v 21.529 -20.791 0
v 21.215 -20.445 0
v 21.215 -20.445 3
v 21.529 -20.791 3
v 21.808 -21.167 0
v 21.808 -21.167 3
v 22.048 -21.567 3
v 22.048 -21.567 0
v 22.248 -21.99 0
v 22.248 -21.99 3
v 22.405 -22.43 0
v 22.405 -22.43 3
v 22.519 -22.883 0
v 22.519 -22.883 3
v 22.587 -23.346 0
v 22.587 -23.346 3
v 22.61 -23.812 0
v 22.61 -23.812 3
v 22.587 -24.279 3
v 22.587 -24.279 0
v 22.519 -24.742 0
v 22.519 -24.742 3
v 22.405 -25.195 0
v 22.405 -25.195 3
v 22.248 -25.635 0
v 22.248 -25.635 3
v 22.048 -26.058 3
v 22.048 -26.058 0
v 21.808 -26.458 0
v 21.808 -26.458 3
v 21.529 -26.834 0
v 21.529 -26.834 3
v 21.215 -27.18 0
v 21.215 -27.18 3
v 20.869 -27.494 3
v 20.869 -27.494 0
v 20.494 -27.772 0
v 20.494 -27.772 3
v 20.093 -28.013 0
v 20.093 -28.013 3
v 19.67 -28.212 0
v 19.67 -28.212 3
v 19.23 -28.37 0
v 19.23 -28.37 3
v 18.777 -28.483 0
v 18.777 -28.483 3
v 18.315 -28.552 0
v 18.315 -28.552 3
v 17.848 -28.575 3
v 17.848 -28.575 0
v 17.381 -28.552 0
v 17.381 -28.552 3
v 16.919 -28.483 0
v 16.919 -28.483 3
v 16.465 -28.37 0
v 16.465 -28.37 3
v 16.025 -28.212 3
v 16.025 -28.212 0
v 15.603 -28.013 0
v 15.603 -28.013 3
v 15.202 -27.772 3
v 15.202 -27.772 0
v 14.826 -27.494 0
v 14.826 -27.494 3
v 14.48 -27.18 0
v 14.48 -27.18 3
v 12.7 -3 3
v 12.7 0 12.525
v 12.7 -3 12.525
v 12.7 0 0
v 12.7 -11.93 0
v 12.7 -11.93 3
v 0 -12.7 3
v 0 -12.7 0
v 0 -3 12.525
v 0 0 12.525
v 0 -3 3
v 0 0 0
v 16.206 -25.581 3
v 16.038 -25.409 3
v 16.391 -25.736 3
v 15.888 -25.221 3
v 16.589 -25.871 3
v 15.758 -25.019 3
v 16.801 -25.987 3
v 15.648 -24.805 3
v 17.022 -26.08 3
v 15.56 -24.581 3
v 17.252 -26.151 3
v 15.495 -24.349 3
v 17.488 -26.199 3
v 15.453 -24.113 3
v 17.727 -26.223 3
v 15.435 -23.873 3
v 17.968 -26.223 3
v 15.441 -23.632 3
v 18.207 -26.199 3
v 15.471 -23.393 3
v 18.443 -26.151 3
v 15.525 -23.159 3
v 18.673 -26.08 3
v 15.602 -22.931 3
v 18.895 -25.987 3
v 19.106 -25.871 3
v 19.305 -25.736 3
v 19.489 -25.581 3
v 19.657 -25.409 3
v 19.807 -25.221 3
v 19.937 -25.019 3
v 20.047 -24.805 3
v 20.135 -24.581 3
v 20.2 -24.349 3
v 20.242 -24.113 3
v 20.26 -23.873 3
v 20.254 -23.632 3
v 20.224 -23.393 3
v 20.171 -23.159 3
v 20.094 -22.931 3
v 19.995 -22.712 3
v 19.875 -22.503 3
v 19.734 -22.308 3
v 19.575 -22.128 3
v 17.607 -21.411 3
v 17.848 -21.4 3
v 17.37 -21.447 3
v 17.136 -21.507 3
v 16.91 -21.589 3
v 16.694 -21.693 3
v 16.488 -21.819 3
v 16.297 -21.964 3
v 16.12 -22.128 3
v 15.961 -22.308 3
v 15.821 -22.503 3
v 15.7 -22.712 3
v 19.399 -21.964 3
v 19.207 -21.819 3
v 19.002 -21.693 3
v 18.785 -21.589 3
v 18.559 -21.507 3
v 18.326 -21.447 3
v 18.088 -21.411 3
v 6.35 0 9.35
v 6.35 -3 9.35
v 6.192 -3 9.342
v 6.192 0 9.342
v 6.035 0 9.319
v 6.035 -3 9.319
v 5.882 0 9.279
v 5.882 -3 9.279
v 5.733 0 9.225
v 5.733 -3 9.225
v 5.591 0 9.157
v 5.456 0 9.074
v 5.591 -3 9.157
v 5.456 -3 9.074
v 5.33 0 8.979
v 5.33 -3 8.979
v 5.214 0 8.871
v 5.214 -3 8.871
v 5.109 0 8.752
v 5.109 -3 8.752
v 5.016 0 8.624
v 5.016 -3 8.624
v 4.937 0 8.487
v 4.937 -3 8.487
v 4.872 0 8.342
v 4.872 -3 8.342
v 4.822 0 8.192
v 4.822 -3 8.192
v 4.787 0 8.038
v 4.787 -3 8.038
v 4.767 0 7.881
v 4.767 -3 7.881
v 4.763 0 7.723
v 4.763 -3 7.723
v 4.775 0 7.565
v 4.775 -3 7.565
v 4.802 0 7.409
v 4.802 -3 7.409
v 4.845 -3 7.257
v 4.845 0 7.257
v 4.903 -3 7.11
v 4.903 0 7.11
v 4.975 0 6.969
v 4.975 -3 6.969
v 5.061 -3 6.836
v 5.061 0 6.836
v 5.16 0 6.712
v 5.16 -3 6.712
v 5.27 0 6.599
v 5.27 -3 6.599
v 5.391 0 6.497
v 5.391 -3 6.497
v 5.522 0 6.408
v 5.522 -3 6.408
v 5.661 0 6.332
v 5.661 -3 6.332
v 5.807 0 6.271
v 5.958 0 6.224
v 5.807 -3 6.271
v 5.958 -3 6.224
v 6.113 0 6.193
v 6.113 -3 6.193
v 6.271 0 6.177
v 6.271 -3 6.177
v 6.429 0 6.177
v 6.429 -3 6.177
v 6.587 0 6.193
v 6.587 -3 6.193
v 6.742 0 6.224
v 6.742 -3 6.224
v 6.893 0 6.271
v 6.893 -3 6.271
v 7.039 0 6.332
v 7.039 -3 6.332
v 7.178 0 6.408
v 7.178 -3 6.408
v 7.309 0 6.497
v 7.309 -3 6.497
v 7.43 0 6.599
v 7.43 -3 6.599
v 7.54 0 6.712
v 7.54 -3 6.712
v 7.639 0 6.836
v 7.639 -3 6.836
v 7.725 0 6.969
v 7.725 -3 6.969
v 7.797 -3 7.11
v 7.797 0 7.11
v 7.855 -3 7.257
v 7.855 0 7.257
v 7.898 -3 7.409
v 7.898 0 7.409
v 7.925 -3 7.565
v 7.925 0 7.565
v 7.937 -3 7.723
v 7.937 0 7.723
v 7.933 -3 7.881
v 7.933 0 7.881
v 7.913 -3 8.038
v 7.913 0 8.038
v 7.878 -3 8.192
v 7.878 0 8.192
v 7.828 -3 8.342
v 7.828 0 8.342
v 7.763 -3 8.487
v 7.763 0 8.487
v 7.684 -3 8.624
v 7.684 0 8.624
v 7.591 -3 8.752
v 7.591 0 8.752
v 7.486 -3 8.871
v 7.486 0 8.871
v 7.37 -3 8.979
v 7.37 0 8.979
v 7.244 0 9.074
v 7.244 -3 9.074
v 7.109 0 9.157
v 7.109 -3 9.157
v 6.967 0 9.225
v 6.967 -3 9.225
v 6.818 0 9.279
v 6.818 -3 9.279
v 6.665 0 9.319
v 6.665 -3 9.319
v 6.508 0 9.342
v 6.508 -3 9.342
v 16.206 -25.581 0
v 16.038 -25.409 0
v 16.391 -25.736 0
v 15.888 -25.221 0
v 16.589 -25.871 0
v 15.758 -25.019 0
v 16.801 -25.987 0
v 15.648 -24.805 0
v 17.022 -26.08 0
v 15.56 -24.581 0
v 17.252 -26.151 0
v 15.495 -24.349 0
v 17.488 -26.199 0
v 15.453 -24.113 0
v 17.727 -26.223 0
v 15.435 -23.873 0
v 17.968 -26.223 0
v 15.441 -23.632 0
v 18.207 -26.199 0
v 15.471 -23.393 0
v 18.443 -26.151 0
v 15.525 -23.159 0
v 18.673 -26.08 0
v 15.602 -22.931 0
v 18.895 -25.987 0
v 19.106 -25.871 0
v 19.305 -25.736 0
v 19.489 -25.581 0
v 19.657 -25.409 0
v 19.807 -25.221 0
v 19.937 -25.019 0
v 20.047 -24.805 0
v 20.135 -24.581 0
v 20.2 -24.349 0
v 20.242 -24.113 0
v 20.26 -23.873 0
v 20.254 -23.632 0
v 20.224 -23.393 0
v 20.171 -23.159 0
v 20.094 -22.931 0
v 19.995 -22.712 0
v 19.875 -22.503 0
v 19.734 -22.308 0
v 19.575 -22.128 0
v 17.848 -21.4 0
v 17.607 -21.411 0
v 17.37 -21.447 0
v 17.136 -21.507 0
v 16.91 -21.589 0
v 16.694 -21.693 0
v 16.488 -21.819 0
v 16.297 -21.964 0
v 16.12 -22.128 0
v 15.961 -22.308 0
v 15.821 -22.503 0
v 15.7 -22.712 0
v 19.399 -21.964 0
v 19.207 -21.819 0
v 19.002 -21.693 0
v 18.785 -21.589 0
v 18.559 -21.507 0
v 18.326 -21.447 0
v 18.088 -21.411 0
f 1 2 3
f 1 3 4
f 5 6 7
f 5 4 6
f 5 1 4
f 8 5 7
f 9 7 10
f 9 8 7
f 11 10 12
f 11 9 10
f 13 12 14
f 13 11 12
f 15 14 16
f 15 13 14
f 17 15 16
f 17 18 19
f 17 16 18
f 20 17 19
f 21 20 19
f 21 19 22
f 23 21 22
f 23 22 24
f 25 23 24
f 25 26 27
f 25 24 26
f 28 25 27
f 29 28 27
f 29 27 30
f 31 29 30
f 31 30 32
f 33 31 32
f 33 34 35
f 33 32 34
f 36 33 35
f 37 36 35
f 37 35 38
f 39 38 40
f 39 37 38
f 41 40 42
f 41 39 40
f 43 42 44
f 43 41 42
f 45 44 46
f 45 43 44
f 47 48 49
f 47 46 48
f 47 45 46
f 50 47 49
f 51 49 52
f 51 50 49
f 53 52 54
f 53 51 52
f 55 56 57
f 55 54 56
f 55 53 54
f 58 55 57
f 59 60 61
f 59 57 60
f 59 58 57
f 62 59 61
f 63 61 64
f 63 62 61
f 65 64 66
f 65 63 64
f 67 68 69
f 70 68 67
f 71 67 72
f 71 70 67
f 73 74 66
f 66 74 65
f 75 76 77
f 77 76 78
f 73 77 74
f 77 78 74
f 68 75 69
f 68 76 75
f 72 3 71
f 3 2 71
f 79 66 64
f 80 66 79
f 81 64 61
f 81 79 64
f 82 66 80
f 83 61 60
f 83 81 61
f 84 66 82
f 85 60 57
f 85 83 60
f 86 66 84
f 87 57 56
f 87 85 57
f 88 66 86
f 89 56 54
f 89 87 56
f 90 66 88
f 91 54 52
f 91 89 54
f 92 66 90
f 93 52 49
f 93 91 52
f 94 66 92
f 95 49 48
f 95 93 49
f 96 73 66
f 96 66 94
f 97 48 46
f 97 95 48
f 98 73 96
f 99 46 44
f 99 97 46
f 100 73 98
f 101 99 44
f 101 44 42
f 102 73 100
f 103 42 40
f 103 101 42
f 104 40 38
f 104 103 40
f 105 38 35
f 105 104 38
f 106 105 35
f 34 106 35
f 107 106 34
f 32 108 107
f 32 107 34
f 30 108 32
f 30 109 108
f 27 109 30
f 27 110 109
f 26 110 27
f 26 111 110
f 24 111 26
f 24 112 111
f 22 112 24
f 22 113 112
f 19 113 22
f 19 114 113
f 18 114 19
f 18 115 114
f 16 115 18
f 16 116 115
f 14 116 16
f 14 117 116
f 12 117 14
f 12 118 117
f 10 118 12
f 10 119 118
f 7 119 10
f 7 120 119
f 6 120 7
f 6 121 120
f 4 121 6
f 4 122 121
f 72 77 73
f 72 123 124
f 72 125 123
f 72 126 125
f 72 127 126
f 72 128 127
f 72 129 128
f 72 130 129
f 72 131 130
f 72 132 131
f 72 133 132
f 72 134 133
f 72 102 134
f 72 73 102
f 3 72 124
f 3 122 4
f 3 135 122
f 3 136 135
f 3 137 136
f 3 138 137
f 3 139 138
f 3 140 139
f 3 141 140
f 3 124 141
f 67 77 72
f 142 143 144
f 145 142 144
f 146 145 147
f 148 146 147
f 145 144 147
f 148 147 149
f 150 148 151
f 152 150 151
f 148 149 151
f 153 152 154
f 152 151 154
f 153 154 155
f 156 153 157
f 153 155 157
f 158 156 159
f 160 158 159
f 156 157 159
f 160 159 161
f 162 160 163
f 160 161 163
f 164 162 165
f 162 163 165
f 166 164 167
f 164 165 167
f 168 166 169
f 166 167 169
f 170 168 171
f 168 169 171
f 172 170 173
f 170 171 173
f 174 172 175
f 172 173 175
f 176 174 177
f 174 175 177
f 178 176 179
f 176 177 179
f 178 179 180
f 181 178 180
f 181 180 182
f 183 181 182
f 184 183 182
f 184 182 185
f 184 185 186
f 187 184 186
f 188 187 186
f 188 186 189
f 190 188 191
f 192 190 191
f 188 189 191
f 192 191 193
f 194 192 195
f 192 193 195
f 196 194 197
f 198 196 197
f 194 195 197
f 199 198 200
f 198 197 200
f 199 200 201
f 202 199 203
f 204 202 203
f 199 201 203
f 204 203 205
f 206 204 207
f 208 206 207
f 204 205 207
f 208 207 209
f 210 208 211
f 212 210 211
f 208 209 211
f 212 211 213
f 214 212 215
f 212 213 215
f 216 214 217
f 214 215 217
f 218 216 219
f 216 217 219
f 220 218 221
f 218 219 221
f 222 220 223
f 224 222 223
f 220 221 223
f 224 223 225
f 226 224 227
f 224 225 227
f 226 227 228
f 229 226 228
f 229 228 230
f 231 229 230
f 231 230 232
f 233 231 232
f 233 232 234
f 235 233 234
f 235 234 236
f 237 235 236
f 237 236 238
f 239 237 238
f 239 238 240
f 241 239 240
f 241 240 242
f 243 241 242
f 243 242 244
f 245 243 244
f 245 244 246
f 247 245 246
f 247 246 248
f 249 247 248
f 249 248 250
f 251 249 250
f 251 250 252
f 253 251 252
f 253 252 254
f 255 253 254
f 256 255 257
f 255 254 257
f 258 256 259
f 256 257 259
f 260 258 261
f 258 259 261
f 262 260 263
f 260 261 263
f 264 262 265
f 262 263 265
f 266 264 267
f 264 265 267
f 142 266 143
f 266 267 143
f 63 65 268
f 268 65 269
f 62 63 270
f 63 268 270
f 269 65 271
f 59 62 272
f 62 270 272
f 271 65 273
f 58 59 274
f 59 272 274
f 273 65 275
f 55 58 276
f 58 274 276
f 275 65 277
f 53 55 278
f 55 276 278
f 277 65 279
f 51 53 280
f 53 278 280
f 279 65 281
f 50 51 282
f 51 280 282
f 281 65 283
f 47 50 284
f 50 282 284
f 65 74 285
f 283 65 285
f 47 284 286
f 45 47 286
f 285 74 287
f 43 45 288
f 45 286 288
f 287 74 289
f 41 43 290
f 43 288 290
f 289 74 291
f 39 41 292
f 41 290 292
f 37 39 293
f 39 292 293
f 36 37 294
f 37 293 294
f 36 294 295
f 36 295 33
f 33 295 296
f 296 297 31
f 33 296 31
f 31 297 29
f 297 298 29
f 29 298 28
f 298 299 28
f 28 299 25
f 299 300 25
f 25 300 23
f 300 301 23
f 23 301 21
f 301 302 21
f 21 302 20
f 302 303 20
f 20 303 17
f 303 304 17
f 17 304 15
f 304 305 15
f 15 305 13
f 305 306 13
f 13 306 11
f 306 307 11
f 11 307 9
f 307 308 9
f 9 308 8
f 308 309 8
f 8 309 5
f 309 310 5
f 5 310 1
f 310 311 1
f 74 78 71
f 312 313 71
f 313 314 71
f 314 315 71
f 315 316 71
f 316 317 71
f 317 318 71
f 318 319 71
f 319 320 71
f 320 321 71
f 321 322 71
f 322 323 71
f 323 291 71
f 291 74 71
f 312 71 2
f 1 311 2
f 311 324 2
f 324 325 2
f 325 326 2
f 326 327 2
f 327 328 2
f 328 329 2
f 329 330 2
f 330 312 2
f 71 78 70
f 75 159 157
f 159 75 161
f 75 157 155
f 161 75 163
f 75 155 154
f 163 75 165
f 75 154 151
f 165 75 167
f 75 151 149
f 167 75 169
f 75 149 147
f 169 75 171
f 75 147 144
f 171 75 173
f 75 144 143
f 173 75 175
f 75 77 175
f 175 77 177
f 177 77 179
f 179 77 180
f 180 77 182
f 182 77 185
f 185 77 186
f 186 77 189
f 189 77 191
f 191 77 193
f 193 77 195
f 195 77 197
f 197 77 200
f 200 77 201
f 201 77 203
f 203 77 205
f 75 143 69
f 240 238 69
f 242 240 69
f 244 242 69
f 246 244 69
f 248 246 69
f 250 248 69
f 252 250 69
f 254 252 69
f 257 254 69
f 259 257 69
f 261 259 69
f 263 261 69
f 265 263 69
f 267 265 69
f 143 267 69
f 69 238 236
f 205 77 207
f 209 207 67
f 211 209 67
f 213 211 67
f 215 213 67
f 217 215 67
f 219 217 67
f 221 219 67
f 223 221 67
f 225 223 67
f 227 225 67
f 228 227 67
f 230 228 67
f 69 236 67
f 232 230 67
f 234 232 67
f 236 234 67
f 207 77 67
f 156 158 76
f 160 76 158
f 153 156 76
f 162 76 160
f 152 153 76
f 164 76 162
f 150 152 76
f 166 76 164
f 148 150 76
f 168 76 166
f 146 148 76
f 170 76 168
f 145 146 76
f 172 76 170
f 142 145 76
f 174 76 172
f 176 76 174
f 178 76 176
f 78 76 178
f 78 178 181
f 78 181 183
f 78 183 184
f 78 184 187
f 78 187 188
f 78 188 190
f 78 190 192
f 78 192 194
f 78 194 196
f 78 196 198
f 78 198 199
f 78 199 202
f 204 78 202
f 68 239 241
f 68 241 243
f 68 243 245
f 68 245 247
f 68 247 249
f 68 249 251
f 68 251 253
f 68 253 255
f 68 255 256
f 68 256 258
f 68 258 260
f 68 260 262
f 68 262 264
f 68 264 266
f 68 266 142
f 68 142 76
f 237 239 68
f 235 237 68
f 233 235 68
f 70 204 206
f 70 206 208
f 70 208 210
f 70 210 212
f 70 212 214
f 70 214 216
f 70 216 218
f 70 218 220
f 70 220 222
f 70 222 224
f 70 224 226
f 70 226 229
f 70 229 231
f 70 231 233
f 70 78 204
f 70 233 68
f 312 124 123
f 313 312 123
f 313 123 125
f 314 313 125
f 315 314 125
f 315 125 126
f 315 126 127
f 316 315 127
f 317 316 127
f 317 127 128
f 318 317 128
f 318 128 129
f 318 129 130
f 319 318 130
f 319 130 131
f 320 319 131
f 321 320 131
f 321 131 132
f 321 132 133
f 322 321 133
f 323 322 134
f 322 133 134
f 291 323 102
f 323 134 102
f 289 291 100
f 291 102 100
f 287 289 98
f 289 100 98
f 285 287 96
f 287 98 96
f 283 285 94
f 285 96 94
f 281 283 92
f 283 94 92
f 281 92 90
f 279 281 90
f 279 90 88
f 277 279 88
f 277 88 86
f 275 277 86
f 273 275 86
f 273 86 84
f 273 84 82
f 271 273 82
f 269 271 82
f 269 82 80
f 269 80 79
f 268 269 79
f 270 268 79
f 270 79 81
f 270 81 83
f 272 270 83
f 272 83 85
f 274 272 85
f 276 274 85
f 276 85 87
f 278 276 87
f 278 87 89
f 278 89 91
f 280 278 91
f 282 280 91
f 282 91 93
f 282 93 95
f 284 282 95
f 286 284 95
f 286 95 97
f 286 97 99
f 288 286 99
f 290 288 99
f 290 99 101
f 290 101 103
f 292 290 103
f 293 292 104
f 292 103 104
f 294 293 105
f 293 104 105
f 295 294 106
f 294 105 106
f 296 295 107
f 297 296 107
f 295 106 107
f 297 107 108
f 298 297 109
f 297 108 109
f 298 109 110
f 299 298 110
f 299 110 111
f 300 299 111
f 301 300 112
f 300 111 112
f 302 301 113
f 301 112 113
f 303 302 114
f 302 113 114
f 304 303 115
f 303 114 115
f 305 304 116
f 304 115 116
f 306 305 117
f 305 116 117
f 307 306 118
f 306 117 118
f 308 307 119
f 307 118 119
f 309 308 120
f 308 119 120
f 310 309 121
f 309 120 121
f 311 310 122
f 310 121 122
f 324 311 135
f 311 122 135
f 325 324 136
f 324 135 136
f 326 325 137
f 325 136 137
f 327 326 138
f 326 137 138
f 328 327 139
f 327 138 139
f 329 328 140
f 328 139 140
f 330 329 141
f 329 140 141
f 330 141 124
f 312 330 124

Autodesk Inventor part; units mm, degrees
ref_plane "YZ Plane" through (0, 0, 0) normal (1, 0, 0) x (0, 1, 0)
ref_plane "XZ Plane" through (0, 0, 0) normal (0, 1, 0) x (-1, 0, 0)
ref_plane "XY Plane" through (0, 0, 0) normal (0, 0, 1) x (1, 0, 0)
sketch "Sketch1" plane through (0, 0, 0) normal (0, 0, 1) x (1, 0, 0)
  line L0 (0, 0) -> (12.7, 0)
  line L1 (12.7, 0) -> (12.7, -11.9296)
  line L2 (0, 0) -> (0, -12.7)
  line L3 (0, -12.7) -> (14.4801, -27.1801)
  arc A0 (14.4801, -27.1801) -> (21.2153, -20.4449) centre (17.8477, -23.8125) ccw
  line L4 (21.2153, -20.4449) -> (12.7, -11.9296)
  dimension "d10" = 12.7
  dimension "d11" = 12.7
  dimension "d12" = 45
  dimension "d13" = 23.8125
  dimension "d14" = 4.7625
extrude "Extrusion1" add sketch "Sketch1" along normal blind 3
sketch "Sketch2" plane through (0, 0, 3) normal (0, 0, 1) x (1, 0, 0)
  line L0 (12.7, 0) -> (12.7, -11.9296) projected
  line L1 (0, 0) -> (12.7, 0) projected
  line L2 (0, -12.7) -> (0, 0) projected
  line L3 (0, -3) -> (12.7, -3)
  dimension "d17" = 3
extrude "Extrusion2" add sketch "Sketch2" along normal blind 9.525
sketch "Sketch3" plane through (0, 0, 0) normal (0, 1, 0) x (1, 0, 0)
  line L0 (0, 0) -> (0, -12.525) projected
  line L1 (0, -12.525) -> (12.7, -12.525) projected
  point P0 (6.35, -7.7625)
  dimension "d20" = 4.7625
  dimension "d21" = 6.35
hole "Hole1" at (6.35, 0, 7.7625) direction (0, -1, 0) diameter 3.175 end through all
sketch "Sketch4" plane through (0, 0, 0) normal (0, 0, -1) x (-1, 0, 0)
  arc A0 (-21.2153, -20.4449) -> (-14.4801, -27.1801) centre (-17.8477, -23.8125) ccw projected
hole "Hole2" at (17.8477, -23.8125, 0) direction (0, 0, 1) diameter 4.826 end through all
properties part number "PWTR-0043" material "Stainless Steel, 303"
